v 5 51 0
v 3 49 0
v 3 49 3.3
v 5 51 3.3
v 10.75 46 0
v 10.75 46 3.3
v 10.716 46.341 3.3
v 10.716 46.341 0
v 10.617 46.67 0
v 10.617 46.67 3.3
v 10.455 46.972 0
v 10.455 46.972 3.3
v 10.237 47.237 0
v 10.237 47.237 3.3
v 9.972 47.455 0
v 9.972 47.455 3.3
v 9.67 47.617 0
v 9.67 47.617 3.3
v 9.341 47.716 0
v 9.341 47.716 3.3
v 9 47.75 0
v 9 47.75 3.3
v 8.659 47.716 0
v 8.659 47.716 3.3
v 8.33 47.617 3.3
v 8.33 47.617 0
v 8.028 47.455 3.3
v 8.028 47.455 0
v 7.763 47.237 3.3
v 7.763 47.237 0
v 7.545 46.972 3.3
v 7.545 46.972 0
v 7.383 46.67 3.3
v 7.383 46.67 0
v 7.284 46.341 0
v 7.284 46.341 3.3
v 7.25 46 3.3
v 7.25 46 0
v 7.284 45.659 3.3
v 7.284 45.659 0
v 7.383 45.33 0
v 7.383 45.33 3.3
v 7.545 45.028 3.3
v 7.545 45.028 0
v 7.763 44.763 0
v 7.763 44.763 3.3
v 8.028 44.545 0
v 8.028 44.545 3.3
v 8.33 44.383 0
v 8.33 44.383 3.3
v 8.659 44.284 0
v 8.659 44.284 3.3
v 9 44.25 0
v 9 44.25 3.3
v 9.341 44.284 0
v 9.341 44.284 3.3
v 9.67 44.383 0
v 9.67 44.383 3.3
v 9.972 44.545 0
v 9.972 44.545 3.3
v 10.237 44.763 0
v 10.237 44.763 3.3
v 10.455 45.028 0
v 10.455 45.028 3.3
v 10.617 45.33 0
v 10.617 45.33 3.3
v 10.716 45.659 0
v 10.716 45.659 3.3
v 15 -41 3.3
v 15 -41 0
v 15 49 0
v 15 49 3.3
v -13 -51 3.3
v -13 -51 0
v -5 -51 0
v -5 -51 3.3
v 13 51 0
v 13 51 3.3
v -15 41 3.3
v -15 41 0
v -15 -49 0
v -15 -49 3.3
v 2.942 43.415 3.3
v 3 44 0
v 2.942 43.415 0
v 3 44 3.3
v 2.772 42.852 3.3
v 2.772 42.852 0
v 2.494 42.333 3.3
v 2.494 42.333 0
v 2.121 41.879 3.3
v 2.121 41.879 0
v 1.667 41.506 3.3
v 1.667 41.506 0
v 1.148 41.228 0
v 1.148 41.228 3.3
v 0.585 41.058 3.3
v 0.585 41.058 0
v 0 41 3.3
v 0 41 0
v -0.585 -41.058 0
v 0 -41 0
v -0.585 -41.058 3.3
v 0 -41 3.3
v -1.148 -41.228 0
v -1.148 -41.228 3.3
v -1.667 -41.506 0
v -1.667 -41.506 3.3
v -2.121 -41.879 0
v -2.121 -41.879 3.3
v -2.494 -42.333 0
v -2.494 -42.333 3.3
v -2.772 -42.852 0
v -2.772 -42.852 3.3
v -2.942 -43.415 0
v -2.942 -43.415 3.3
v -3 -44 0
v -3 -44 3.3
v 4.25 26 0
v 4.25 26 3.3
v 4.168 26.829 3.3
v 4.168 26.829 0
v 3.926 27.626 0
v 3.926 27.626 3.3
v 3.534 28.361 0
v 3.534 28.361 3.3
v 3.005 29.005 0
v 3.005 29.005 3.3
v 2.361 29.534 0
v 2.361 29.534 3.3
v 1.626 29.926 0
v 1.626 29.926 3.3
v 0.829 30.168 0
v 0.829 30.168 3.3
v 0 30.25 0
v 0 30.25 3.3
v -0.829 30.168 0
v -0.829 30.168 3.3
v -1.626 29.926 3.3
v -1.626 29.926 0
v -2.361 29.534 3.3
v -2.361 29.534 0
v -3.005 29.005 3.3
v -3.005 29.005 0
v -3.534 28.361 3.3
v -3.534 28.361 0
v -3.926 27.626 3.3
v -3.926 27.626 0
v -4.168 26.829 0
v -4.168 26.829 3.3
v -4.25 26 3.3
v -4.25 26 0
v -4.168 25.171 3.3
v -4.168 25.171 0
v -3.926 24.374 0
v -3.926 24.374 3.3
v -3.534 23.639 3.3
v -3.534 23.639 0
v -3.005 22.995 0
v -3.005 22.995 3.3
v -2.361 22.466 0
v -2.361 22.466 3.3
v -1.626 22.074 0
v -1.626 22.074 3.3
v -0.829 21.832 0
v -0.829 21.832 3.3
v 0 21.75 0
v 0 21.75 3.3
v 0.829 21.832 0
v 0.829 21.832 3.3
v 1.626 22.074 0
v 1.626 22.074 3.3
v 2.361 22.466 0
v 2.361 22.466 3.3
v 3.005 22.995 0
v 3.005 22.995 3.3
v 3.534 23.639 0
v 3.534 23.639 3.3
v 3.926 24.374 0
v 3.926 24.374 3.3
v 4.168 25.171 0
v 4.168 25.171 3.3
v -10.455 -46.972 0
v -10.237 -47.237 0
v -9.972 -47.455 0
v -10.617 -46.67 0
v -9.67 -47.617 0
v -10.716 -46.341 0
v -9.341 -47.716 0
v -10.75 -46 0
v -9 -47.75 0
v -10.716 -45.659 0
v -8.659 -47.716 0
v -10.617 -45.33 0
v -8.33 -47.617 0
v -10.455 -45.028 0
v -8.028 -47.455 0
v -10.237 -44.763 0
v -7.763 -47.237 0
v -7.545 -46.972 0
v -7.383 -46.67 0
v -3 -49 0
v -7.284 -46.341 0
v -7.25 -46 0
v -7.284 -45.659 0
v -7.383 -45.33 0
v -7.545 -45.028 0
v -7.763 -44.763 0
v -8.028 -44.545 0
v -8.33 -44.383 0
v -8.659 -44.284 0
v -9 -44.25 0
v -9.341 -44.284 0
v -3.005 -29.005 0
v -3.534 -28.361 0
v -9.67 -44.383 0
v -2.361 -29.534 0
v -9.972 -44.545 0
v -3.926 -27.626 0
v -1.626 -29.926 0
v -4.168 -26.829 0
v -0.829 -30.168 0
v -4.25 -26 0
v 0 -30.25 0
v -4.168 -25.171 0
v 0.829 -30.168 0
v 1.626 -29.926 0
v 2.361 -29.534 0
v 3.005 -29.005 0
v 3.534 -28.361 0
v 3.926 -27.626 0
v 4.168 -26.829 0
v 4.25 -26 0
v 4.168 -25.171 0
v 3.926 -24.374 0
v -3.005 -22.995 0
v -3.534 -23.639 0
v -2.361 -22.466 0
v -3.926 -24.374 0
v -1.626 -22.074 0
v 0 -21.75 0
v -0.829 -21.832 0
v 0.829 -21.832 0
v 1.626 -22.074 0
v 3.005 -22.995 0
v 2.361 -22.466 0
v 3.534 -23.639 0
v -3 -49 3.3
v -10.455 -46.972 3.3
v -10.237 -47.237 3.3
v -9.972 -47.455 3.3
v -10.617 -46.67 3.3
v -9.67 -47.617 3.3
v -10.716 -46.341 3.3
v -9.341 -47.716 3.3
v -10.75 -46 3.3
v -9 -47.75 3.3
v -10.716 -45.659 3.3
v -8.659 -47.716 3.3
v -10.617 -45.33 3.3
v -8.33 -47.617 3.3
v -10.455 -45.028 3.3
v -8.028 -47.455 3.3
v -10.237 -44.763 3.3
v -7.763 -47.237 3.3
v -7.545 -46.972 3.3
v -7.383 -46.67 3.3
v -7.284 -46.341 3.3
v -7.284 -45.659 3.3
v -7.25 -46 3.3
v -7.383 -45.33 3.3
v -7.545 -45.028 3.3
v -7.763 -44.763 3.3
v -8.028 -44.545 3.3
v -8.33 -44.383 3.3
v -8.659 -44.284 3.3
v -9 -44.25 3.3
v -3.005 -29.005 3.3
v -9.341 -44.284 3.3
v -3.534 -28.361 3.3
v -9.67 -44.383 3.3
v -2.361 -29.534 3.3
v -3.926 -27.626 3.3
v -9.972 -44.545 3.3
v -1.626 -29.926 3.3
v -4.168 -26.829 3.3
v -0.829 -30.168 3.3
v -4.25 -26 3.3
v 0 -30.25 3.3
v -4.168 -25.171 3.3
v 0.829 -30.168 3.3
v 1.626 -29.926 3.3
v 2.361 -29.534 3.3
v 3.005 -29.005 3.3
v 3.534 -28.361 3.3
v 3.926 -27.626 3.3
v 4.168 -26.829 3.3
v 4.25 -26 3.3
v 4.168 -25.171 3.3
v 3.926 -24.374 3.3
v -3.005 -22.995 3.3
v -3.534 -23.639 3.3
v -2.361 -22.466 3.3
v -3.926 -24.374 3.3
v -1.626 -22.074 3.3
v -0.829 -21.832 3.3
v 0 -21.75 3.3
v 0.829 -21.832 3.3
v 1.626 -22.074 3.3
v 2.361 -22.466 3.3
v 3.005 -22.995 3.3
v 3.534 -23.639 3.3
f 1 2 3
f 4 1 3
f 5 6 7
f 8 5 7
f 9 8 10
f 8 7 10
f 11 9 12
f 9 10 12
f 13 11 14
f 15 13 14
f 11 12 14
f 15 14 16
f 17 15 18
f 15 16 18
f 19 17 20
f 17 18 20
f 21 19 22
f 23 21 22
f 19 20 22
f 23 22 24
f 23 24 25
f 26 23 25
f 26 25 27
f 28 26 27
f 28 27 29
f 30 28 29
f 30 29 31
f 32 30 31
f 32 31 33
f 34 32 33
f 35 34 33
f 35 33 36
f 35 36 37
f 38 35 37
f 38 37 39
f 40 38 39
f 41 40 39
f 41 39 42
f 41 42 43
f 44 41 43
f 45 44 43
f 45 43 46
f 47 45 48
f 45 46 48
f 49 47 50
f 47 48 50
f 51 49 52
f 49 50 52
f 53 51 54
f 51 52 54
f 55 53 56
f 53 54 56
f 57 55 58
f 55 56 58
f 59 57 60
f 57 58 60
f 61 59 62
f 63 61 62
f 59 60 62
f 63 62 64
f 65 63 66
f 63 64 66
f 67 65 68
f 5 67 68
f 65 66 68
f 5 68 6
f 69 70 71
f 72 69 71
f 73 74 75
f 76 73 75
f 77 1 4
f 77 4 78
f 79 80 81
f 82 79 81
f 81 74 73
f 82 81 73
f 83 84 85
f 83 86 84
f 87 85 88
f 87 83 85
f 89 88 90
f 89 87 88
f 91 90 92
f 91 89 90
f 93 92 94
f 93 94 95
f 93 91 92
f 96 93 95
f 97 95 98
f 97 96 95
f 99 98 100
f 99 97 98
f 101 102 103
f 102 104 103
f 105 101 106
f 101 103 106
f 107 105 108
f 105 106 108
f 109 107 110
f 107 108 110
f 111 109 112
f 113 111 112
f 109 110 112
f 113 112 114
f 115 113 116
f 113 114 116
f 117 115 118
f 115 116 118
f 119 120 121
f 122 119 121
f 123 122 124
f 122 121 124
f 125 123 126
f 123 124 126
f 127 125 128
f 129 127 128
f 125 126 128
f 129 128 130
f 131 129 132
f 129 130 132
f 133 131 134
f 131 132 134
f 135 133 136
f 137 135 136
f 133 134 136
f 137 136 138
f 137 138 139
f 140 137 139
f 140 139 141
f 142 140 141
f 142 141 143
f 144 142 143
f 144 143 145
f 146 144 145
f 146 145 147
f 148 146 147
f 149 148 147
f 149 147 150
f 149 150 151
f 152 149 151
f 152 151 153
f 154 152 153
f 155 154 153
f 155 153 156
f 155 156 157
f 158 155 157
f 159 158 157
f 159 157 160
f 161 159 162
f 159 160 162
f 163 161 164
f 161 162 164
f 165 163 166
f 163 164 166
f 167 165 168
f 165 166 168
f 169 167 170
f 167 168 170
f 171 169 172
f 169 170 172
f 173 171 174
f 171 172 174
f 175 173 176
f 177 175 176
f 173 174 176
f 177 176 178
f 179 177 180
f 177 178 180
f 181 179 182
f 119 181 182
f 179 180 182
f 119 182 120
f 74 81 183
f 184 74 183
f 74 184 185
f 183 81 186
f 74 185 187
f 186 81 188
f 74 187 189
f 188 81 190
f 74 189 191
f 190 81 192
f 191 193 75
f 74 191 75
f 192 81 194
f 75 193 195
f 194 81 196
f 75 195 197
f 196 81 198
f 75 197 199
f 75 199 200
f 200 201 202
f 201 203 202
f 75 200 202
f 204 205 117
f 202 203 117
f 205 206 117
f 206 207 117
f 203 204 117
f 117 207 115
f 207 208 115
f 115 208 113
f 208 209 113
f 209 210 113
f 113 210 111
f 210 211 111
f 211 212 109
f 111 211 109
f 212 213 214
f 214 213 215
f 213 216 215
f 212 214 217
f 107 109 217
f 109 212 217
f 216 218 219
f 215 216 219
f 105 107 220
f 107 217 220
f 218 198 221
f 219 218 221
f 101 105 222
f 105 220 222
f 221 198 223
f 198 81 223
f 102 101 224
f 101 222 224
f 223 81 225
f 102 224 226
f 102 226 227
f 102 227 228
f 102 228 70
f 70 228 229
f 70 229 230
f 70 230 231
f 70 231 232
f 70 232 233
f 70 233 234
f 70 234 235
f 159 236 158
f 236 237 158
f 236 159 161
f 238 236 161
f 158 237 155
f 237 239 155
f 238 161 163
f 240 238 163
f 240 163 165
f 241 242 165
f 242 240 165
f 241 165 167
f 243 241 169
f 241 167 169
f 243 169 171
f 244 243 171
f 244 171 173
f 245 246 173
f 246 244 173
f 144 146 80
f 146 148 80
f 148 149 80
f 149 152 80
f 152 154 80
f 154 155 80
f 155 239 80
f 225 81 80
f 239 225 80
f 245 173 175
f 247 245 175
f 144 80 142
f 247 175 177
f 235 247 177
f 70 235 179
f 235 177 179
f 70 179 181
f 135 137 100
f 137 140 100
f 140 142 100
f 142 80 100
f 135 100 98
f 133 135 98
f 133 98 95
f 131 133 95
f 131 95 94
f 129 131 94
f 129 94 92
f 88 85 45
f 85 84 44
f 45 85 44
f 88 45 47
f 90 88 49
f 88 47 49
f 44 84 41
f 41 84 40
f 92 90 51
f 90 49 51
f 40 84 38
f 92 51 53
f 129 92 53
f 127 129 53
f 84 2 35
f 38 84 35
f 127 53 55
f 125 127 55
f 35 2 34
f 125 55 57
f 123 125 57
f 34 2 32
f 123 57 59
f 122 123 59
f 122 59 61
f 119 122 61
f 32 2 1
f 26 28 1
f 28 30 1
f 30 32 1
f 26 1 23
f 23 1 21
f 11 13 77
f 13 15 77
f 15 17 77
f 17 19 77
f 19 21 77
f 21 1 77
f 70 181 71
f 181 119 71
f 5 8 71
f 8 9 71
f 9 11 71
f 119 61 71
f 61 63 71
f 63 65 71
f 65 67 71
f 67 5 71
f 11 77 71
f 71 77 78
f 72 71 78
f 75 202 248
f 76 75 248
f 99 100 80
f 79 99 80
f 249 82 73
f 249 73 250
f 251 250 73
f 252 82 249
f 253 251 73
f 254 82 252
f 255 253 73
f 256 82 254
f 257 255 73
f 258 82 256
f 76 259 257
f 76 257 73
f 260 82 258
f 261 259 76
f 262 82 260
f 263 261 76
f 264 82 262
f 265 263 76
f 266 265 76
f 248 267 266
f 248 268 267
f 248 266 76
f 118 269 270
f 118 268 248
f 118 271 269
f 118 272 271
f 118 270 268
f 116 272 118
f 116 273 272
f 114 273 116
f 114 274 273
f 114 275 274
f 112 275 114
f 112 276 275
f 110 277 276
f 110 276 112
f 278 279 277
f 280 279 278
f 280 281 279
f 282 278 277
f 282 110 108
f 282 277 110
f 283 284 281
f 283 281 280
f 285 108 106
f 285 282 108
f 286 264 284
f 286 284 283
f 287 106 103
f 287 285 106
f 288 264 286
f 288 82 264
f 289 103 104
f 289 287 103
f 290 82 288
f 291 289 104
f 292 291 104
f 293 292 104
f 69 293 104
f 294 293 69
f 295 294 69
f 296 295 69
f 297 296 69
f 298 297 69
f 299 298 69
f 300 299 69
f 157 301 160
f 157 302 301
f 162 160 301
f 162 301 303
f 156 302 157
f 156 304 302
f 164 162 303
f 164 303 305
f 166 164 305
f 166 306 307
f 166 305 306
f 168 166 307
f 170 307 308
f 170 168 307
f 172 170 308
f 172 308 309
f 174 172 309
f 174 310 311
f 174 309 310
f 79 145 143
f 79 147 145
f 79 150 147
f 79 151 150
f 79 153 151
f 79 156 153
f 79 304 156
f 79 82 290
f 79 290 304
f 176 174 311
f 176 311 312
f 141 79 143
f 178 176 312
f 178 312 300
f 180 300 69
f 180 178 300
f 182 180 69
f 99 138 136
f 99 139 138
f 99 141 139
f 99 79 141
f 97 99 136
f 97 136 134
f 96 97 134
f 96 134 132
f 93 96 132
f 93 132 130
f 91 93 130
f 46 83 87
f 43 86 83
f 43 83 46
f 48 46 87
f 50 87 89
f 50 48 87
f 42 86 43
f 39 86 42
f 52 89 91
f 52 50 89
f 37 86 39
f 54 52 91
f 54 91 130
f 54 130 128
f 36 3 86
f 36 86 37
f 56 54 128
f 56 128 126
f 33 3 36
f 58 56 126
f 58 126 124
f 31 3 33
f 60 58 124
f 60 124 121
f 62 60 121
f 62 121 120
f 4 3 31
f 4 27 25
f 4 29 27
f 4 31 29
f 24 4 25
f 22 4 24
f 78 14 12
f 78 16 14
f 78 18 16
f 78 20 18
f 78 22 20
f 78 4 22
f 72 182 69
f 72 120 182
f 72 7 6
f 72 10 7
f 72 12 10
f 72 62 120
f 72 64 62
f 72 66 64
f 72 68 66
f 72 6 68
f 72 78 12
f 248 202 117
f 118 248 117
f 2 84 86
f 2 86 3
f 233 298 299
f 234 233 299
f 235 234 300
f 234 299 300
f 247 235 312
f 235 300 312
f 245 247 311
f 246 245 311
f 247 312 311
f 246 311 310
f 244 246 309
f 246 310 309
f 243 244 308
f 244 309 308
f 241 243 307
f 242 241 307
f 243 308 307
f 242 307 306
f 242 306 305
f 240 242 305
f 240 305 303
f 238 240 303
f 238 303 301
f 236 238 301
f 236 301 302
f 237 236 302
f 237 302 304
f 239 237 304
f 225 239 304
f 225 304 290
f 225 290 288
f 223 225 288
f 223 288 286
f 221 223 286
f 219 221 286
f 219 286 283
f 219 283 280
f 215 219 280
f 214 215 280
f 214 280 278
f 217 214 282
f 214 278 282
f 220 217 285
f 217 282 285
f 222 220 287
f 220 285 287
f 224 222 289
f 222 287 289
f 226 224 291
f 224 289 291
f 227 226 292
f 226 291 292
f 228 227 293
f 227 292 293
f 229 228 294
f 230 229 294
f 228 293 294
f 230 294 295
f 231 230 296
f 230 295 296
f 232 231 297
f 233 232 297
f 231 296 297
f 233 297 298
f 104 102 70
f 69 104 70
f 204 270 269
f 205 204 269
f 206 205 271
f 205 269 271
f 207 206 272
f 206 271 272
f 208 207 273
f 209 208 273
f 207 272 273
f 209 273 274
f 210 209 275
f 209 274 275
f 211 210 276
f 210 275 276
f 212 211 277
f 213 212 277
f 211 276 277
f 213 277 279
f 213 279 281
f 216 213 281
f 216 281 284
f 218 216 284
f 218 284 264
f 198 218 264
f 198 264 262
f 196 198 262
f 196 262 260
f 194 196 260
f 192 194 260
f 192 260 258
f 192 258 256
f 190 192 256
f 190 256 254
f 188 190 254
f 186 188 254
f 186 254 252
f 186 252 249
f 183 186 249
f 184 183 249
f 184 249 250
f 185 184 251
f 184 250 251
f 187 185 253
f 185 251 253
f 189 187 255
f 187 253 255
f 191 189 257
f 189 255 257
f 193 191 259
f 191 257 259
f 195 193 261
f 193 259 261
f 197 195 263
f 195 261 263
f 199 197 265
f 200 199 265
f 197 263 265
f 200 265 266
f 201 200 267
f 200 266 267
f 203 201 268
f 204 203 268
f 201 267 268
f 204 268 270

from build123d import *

# Parameters (mm, degrees)
F0_W      = 12
F0_H      = 10
F1_DEPTH  = 3.3
F2_SIZE   = 2
F3_R      = 3
F4_R      = 3
F5_R      = 1.75
F6_DEPTH  = 25
F7_R      = 2.5
F8_DEPTH  = 25
F9_R      = 4.25
F10_DEPTH = 25


with BuildPart() as f1:
    # F0 (on Top) → F1 (new body)
    with BuildSketch(Plane.XY):
        Polygon((15, -41), (15, 41), (3, 41), (-15, 41), (-15, -41), (-3, -41), align=None)
        with Locations((9, 46)):
            Rectangle(F0_W, F0_H)
        with Locations((-9, -46)):
            Rectangle(F0_W, F0_H)
    extrude(amount=F1_DEPTH)

    # F2
    f2_edges = [f1.edges().sort_by_distance(p)[0] for p in [
        (15, 51, 1.65),
        (3, 51, 1.65),
        (-15, -51, 1.65),
        (-3, -51, 1.65),
    ]]
    chamfer(f2_edges, length=F2_SIZE)

    # F3
    f3_edges = [f1.edges().sort_by_distance(p)[0] for p in [
        (3, 41, 1.65),
    ]]
    fillet(f3_edges, radius=F3_R)

    # F4
    f4_edges = [f1.edges().sort_by_distance(p)[0] for p in [
        (-3, -41, 1.65),
    ]]
    fillet(f4_edges, radius=F4_R)

    # F5 (on face) → F6 (cut)
    with BuildSketch(Plane.XY.offset(3.3)):
        with Locations((9, 46)):
            Circle(F5_R)
        with Locations((-9, -46)):
            Circle(F5_R)
    extrude(amount=-F6_DEPTH, mode=Mode.SUBTRACT)

    # F7 (on face) → F8 (cut)
    with BuildSketch(Plane.XY.offset(3.3)):
        with Locations((0, 26)):
            Circle(F7_R)
        with Locations((0, -26)):
            Circle(F7_R)
    extrude(amount=-F8_DEPTH, mode=Mode.SUBTRACT)

    # F9 (on face) → F10 (cut)
    with BuildSketch(Plane.XY.offset(3.3)):
        with Locations((0, 26)):
            Circle(F9_R)
        with Locations((0, -26)):
            Circle(F9_R)
    extrude(amount=-F10_DEPTH, mode=Mode.SUBTRACT)


solid = f1.part
